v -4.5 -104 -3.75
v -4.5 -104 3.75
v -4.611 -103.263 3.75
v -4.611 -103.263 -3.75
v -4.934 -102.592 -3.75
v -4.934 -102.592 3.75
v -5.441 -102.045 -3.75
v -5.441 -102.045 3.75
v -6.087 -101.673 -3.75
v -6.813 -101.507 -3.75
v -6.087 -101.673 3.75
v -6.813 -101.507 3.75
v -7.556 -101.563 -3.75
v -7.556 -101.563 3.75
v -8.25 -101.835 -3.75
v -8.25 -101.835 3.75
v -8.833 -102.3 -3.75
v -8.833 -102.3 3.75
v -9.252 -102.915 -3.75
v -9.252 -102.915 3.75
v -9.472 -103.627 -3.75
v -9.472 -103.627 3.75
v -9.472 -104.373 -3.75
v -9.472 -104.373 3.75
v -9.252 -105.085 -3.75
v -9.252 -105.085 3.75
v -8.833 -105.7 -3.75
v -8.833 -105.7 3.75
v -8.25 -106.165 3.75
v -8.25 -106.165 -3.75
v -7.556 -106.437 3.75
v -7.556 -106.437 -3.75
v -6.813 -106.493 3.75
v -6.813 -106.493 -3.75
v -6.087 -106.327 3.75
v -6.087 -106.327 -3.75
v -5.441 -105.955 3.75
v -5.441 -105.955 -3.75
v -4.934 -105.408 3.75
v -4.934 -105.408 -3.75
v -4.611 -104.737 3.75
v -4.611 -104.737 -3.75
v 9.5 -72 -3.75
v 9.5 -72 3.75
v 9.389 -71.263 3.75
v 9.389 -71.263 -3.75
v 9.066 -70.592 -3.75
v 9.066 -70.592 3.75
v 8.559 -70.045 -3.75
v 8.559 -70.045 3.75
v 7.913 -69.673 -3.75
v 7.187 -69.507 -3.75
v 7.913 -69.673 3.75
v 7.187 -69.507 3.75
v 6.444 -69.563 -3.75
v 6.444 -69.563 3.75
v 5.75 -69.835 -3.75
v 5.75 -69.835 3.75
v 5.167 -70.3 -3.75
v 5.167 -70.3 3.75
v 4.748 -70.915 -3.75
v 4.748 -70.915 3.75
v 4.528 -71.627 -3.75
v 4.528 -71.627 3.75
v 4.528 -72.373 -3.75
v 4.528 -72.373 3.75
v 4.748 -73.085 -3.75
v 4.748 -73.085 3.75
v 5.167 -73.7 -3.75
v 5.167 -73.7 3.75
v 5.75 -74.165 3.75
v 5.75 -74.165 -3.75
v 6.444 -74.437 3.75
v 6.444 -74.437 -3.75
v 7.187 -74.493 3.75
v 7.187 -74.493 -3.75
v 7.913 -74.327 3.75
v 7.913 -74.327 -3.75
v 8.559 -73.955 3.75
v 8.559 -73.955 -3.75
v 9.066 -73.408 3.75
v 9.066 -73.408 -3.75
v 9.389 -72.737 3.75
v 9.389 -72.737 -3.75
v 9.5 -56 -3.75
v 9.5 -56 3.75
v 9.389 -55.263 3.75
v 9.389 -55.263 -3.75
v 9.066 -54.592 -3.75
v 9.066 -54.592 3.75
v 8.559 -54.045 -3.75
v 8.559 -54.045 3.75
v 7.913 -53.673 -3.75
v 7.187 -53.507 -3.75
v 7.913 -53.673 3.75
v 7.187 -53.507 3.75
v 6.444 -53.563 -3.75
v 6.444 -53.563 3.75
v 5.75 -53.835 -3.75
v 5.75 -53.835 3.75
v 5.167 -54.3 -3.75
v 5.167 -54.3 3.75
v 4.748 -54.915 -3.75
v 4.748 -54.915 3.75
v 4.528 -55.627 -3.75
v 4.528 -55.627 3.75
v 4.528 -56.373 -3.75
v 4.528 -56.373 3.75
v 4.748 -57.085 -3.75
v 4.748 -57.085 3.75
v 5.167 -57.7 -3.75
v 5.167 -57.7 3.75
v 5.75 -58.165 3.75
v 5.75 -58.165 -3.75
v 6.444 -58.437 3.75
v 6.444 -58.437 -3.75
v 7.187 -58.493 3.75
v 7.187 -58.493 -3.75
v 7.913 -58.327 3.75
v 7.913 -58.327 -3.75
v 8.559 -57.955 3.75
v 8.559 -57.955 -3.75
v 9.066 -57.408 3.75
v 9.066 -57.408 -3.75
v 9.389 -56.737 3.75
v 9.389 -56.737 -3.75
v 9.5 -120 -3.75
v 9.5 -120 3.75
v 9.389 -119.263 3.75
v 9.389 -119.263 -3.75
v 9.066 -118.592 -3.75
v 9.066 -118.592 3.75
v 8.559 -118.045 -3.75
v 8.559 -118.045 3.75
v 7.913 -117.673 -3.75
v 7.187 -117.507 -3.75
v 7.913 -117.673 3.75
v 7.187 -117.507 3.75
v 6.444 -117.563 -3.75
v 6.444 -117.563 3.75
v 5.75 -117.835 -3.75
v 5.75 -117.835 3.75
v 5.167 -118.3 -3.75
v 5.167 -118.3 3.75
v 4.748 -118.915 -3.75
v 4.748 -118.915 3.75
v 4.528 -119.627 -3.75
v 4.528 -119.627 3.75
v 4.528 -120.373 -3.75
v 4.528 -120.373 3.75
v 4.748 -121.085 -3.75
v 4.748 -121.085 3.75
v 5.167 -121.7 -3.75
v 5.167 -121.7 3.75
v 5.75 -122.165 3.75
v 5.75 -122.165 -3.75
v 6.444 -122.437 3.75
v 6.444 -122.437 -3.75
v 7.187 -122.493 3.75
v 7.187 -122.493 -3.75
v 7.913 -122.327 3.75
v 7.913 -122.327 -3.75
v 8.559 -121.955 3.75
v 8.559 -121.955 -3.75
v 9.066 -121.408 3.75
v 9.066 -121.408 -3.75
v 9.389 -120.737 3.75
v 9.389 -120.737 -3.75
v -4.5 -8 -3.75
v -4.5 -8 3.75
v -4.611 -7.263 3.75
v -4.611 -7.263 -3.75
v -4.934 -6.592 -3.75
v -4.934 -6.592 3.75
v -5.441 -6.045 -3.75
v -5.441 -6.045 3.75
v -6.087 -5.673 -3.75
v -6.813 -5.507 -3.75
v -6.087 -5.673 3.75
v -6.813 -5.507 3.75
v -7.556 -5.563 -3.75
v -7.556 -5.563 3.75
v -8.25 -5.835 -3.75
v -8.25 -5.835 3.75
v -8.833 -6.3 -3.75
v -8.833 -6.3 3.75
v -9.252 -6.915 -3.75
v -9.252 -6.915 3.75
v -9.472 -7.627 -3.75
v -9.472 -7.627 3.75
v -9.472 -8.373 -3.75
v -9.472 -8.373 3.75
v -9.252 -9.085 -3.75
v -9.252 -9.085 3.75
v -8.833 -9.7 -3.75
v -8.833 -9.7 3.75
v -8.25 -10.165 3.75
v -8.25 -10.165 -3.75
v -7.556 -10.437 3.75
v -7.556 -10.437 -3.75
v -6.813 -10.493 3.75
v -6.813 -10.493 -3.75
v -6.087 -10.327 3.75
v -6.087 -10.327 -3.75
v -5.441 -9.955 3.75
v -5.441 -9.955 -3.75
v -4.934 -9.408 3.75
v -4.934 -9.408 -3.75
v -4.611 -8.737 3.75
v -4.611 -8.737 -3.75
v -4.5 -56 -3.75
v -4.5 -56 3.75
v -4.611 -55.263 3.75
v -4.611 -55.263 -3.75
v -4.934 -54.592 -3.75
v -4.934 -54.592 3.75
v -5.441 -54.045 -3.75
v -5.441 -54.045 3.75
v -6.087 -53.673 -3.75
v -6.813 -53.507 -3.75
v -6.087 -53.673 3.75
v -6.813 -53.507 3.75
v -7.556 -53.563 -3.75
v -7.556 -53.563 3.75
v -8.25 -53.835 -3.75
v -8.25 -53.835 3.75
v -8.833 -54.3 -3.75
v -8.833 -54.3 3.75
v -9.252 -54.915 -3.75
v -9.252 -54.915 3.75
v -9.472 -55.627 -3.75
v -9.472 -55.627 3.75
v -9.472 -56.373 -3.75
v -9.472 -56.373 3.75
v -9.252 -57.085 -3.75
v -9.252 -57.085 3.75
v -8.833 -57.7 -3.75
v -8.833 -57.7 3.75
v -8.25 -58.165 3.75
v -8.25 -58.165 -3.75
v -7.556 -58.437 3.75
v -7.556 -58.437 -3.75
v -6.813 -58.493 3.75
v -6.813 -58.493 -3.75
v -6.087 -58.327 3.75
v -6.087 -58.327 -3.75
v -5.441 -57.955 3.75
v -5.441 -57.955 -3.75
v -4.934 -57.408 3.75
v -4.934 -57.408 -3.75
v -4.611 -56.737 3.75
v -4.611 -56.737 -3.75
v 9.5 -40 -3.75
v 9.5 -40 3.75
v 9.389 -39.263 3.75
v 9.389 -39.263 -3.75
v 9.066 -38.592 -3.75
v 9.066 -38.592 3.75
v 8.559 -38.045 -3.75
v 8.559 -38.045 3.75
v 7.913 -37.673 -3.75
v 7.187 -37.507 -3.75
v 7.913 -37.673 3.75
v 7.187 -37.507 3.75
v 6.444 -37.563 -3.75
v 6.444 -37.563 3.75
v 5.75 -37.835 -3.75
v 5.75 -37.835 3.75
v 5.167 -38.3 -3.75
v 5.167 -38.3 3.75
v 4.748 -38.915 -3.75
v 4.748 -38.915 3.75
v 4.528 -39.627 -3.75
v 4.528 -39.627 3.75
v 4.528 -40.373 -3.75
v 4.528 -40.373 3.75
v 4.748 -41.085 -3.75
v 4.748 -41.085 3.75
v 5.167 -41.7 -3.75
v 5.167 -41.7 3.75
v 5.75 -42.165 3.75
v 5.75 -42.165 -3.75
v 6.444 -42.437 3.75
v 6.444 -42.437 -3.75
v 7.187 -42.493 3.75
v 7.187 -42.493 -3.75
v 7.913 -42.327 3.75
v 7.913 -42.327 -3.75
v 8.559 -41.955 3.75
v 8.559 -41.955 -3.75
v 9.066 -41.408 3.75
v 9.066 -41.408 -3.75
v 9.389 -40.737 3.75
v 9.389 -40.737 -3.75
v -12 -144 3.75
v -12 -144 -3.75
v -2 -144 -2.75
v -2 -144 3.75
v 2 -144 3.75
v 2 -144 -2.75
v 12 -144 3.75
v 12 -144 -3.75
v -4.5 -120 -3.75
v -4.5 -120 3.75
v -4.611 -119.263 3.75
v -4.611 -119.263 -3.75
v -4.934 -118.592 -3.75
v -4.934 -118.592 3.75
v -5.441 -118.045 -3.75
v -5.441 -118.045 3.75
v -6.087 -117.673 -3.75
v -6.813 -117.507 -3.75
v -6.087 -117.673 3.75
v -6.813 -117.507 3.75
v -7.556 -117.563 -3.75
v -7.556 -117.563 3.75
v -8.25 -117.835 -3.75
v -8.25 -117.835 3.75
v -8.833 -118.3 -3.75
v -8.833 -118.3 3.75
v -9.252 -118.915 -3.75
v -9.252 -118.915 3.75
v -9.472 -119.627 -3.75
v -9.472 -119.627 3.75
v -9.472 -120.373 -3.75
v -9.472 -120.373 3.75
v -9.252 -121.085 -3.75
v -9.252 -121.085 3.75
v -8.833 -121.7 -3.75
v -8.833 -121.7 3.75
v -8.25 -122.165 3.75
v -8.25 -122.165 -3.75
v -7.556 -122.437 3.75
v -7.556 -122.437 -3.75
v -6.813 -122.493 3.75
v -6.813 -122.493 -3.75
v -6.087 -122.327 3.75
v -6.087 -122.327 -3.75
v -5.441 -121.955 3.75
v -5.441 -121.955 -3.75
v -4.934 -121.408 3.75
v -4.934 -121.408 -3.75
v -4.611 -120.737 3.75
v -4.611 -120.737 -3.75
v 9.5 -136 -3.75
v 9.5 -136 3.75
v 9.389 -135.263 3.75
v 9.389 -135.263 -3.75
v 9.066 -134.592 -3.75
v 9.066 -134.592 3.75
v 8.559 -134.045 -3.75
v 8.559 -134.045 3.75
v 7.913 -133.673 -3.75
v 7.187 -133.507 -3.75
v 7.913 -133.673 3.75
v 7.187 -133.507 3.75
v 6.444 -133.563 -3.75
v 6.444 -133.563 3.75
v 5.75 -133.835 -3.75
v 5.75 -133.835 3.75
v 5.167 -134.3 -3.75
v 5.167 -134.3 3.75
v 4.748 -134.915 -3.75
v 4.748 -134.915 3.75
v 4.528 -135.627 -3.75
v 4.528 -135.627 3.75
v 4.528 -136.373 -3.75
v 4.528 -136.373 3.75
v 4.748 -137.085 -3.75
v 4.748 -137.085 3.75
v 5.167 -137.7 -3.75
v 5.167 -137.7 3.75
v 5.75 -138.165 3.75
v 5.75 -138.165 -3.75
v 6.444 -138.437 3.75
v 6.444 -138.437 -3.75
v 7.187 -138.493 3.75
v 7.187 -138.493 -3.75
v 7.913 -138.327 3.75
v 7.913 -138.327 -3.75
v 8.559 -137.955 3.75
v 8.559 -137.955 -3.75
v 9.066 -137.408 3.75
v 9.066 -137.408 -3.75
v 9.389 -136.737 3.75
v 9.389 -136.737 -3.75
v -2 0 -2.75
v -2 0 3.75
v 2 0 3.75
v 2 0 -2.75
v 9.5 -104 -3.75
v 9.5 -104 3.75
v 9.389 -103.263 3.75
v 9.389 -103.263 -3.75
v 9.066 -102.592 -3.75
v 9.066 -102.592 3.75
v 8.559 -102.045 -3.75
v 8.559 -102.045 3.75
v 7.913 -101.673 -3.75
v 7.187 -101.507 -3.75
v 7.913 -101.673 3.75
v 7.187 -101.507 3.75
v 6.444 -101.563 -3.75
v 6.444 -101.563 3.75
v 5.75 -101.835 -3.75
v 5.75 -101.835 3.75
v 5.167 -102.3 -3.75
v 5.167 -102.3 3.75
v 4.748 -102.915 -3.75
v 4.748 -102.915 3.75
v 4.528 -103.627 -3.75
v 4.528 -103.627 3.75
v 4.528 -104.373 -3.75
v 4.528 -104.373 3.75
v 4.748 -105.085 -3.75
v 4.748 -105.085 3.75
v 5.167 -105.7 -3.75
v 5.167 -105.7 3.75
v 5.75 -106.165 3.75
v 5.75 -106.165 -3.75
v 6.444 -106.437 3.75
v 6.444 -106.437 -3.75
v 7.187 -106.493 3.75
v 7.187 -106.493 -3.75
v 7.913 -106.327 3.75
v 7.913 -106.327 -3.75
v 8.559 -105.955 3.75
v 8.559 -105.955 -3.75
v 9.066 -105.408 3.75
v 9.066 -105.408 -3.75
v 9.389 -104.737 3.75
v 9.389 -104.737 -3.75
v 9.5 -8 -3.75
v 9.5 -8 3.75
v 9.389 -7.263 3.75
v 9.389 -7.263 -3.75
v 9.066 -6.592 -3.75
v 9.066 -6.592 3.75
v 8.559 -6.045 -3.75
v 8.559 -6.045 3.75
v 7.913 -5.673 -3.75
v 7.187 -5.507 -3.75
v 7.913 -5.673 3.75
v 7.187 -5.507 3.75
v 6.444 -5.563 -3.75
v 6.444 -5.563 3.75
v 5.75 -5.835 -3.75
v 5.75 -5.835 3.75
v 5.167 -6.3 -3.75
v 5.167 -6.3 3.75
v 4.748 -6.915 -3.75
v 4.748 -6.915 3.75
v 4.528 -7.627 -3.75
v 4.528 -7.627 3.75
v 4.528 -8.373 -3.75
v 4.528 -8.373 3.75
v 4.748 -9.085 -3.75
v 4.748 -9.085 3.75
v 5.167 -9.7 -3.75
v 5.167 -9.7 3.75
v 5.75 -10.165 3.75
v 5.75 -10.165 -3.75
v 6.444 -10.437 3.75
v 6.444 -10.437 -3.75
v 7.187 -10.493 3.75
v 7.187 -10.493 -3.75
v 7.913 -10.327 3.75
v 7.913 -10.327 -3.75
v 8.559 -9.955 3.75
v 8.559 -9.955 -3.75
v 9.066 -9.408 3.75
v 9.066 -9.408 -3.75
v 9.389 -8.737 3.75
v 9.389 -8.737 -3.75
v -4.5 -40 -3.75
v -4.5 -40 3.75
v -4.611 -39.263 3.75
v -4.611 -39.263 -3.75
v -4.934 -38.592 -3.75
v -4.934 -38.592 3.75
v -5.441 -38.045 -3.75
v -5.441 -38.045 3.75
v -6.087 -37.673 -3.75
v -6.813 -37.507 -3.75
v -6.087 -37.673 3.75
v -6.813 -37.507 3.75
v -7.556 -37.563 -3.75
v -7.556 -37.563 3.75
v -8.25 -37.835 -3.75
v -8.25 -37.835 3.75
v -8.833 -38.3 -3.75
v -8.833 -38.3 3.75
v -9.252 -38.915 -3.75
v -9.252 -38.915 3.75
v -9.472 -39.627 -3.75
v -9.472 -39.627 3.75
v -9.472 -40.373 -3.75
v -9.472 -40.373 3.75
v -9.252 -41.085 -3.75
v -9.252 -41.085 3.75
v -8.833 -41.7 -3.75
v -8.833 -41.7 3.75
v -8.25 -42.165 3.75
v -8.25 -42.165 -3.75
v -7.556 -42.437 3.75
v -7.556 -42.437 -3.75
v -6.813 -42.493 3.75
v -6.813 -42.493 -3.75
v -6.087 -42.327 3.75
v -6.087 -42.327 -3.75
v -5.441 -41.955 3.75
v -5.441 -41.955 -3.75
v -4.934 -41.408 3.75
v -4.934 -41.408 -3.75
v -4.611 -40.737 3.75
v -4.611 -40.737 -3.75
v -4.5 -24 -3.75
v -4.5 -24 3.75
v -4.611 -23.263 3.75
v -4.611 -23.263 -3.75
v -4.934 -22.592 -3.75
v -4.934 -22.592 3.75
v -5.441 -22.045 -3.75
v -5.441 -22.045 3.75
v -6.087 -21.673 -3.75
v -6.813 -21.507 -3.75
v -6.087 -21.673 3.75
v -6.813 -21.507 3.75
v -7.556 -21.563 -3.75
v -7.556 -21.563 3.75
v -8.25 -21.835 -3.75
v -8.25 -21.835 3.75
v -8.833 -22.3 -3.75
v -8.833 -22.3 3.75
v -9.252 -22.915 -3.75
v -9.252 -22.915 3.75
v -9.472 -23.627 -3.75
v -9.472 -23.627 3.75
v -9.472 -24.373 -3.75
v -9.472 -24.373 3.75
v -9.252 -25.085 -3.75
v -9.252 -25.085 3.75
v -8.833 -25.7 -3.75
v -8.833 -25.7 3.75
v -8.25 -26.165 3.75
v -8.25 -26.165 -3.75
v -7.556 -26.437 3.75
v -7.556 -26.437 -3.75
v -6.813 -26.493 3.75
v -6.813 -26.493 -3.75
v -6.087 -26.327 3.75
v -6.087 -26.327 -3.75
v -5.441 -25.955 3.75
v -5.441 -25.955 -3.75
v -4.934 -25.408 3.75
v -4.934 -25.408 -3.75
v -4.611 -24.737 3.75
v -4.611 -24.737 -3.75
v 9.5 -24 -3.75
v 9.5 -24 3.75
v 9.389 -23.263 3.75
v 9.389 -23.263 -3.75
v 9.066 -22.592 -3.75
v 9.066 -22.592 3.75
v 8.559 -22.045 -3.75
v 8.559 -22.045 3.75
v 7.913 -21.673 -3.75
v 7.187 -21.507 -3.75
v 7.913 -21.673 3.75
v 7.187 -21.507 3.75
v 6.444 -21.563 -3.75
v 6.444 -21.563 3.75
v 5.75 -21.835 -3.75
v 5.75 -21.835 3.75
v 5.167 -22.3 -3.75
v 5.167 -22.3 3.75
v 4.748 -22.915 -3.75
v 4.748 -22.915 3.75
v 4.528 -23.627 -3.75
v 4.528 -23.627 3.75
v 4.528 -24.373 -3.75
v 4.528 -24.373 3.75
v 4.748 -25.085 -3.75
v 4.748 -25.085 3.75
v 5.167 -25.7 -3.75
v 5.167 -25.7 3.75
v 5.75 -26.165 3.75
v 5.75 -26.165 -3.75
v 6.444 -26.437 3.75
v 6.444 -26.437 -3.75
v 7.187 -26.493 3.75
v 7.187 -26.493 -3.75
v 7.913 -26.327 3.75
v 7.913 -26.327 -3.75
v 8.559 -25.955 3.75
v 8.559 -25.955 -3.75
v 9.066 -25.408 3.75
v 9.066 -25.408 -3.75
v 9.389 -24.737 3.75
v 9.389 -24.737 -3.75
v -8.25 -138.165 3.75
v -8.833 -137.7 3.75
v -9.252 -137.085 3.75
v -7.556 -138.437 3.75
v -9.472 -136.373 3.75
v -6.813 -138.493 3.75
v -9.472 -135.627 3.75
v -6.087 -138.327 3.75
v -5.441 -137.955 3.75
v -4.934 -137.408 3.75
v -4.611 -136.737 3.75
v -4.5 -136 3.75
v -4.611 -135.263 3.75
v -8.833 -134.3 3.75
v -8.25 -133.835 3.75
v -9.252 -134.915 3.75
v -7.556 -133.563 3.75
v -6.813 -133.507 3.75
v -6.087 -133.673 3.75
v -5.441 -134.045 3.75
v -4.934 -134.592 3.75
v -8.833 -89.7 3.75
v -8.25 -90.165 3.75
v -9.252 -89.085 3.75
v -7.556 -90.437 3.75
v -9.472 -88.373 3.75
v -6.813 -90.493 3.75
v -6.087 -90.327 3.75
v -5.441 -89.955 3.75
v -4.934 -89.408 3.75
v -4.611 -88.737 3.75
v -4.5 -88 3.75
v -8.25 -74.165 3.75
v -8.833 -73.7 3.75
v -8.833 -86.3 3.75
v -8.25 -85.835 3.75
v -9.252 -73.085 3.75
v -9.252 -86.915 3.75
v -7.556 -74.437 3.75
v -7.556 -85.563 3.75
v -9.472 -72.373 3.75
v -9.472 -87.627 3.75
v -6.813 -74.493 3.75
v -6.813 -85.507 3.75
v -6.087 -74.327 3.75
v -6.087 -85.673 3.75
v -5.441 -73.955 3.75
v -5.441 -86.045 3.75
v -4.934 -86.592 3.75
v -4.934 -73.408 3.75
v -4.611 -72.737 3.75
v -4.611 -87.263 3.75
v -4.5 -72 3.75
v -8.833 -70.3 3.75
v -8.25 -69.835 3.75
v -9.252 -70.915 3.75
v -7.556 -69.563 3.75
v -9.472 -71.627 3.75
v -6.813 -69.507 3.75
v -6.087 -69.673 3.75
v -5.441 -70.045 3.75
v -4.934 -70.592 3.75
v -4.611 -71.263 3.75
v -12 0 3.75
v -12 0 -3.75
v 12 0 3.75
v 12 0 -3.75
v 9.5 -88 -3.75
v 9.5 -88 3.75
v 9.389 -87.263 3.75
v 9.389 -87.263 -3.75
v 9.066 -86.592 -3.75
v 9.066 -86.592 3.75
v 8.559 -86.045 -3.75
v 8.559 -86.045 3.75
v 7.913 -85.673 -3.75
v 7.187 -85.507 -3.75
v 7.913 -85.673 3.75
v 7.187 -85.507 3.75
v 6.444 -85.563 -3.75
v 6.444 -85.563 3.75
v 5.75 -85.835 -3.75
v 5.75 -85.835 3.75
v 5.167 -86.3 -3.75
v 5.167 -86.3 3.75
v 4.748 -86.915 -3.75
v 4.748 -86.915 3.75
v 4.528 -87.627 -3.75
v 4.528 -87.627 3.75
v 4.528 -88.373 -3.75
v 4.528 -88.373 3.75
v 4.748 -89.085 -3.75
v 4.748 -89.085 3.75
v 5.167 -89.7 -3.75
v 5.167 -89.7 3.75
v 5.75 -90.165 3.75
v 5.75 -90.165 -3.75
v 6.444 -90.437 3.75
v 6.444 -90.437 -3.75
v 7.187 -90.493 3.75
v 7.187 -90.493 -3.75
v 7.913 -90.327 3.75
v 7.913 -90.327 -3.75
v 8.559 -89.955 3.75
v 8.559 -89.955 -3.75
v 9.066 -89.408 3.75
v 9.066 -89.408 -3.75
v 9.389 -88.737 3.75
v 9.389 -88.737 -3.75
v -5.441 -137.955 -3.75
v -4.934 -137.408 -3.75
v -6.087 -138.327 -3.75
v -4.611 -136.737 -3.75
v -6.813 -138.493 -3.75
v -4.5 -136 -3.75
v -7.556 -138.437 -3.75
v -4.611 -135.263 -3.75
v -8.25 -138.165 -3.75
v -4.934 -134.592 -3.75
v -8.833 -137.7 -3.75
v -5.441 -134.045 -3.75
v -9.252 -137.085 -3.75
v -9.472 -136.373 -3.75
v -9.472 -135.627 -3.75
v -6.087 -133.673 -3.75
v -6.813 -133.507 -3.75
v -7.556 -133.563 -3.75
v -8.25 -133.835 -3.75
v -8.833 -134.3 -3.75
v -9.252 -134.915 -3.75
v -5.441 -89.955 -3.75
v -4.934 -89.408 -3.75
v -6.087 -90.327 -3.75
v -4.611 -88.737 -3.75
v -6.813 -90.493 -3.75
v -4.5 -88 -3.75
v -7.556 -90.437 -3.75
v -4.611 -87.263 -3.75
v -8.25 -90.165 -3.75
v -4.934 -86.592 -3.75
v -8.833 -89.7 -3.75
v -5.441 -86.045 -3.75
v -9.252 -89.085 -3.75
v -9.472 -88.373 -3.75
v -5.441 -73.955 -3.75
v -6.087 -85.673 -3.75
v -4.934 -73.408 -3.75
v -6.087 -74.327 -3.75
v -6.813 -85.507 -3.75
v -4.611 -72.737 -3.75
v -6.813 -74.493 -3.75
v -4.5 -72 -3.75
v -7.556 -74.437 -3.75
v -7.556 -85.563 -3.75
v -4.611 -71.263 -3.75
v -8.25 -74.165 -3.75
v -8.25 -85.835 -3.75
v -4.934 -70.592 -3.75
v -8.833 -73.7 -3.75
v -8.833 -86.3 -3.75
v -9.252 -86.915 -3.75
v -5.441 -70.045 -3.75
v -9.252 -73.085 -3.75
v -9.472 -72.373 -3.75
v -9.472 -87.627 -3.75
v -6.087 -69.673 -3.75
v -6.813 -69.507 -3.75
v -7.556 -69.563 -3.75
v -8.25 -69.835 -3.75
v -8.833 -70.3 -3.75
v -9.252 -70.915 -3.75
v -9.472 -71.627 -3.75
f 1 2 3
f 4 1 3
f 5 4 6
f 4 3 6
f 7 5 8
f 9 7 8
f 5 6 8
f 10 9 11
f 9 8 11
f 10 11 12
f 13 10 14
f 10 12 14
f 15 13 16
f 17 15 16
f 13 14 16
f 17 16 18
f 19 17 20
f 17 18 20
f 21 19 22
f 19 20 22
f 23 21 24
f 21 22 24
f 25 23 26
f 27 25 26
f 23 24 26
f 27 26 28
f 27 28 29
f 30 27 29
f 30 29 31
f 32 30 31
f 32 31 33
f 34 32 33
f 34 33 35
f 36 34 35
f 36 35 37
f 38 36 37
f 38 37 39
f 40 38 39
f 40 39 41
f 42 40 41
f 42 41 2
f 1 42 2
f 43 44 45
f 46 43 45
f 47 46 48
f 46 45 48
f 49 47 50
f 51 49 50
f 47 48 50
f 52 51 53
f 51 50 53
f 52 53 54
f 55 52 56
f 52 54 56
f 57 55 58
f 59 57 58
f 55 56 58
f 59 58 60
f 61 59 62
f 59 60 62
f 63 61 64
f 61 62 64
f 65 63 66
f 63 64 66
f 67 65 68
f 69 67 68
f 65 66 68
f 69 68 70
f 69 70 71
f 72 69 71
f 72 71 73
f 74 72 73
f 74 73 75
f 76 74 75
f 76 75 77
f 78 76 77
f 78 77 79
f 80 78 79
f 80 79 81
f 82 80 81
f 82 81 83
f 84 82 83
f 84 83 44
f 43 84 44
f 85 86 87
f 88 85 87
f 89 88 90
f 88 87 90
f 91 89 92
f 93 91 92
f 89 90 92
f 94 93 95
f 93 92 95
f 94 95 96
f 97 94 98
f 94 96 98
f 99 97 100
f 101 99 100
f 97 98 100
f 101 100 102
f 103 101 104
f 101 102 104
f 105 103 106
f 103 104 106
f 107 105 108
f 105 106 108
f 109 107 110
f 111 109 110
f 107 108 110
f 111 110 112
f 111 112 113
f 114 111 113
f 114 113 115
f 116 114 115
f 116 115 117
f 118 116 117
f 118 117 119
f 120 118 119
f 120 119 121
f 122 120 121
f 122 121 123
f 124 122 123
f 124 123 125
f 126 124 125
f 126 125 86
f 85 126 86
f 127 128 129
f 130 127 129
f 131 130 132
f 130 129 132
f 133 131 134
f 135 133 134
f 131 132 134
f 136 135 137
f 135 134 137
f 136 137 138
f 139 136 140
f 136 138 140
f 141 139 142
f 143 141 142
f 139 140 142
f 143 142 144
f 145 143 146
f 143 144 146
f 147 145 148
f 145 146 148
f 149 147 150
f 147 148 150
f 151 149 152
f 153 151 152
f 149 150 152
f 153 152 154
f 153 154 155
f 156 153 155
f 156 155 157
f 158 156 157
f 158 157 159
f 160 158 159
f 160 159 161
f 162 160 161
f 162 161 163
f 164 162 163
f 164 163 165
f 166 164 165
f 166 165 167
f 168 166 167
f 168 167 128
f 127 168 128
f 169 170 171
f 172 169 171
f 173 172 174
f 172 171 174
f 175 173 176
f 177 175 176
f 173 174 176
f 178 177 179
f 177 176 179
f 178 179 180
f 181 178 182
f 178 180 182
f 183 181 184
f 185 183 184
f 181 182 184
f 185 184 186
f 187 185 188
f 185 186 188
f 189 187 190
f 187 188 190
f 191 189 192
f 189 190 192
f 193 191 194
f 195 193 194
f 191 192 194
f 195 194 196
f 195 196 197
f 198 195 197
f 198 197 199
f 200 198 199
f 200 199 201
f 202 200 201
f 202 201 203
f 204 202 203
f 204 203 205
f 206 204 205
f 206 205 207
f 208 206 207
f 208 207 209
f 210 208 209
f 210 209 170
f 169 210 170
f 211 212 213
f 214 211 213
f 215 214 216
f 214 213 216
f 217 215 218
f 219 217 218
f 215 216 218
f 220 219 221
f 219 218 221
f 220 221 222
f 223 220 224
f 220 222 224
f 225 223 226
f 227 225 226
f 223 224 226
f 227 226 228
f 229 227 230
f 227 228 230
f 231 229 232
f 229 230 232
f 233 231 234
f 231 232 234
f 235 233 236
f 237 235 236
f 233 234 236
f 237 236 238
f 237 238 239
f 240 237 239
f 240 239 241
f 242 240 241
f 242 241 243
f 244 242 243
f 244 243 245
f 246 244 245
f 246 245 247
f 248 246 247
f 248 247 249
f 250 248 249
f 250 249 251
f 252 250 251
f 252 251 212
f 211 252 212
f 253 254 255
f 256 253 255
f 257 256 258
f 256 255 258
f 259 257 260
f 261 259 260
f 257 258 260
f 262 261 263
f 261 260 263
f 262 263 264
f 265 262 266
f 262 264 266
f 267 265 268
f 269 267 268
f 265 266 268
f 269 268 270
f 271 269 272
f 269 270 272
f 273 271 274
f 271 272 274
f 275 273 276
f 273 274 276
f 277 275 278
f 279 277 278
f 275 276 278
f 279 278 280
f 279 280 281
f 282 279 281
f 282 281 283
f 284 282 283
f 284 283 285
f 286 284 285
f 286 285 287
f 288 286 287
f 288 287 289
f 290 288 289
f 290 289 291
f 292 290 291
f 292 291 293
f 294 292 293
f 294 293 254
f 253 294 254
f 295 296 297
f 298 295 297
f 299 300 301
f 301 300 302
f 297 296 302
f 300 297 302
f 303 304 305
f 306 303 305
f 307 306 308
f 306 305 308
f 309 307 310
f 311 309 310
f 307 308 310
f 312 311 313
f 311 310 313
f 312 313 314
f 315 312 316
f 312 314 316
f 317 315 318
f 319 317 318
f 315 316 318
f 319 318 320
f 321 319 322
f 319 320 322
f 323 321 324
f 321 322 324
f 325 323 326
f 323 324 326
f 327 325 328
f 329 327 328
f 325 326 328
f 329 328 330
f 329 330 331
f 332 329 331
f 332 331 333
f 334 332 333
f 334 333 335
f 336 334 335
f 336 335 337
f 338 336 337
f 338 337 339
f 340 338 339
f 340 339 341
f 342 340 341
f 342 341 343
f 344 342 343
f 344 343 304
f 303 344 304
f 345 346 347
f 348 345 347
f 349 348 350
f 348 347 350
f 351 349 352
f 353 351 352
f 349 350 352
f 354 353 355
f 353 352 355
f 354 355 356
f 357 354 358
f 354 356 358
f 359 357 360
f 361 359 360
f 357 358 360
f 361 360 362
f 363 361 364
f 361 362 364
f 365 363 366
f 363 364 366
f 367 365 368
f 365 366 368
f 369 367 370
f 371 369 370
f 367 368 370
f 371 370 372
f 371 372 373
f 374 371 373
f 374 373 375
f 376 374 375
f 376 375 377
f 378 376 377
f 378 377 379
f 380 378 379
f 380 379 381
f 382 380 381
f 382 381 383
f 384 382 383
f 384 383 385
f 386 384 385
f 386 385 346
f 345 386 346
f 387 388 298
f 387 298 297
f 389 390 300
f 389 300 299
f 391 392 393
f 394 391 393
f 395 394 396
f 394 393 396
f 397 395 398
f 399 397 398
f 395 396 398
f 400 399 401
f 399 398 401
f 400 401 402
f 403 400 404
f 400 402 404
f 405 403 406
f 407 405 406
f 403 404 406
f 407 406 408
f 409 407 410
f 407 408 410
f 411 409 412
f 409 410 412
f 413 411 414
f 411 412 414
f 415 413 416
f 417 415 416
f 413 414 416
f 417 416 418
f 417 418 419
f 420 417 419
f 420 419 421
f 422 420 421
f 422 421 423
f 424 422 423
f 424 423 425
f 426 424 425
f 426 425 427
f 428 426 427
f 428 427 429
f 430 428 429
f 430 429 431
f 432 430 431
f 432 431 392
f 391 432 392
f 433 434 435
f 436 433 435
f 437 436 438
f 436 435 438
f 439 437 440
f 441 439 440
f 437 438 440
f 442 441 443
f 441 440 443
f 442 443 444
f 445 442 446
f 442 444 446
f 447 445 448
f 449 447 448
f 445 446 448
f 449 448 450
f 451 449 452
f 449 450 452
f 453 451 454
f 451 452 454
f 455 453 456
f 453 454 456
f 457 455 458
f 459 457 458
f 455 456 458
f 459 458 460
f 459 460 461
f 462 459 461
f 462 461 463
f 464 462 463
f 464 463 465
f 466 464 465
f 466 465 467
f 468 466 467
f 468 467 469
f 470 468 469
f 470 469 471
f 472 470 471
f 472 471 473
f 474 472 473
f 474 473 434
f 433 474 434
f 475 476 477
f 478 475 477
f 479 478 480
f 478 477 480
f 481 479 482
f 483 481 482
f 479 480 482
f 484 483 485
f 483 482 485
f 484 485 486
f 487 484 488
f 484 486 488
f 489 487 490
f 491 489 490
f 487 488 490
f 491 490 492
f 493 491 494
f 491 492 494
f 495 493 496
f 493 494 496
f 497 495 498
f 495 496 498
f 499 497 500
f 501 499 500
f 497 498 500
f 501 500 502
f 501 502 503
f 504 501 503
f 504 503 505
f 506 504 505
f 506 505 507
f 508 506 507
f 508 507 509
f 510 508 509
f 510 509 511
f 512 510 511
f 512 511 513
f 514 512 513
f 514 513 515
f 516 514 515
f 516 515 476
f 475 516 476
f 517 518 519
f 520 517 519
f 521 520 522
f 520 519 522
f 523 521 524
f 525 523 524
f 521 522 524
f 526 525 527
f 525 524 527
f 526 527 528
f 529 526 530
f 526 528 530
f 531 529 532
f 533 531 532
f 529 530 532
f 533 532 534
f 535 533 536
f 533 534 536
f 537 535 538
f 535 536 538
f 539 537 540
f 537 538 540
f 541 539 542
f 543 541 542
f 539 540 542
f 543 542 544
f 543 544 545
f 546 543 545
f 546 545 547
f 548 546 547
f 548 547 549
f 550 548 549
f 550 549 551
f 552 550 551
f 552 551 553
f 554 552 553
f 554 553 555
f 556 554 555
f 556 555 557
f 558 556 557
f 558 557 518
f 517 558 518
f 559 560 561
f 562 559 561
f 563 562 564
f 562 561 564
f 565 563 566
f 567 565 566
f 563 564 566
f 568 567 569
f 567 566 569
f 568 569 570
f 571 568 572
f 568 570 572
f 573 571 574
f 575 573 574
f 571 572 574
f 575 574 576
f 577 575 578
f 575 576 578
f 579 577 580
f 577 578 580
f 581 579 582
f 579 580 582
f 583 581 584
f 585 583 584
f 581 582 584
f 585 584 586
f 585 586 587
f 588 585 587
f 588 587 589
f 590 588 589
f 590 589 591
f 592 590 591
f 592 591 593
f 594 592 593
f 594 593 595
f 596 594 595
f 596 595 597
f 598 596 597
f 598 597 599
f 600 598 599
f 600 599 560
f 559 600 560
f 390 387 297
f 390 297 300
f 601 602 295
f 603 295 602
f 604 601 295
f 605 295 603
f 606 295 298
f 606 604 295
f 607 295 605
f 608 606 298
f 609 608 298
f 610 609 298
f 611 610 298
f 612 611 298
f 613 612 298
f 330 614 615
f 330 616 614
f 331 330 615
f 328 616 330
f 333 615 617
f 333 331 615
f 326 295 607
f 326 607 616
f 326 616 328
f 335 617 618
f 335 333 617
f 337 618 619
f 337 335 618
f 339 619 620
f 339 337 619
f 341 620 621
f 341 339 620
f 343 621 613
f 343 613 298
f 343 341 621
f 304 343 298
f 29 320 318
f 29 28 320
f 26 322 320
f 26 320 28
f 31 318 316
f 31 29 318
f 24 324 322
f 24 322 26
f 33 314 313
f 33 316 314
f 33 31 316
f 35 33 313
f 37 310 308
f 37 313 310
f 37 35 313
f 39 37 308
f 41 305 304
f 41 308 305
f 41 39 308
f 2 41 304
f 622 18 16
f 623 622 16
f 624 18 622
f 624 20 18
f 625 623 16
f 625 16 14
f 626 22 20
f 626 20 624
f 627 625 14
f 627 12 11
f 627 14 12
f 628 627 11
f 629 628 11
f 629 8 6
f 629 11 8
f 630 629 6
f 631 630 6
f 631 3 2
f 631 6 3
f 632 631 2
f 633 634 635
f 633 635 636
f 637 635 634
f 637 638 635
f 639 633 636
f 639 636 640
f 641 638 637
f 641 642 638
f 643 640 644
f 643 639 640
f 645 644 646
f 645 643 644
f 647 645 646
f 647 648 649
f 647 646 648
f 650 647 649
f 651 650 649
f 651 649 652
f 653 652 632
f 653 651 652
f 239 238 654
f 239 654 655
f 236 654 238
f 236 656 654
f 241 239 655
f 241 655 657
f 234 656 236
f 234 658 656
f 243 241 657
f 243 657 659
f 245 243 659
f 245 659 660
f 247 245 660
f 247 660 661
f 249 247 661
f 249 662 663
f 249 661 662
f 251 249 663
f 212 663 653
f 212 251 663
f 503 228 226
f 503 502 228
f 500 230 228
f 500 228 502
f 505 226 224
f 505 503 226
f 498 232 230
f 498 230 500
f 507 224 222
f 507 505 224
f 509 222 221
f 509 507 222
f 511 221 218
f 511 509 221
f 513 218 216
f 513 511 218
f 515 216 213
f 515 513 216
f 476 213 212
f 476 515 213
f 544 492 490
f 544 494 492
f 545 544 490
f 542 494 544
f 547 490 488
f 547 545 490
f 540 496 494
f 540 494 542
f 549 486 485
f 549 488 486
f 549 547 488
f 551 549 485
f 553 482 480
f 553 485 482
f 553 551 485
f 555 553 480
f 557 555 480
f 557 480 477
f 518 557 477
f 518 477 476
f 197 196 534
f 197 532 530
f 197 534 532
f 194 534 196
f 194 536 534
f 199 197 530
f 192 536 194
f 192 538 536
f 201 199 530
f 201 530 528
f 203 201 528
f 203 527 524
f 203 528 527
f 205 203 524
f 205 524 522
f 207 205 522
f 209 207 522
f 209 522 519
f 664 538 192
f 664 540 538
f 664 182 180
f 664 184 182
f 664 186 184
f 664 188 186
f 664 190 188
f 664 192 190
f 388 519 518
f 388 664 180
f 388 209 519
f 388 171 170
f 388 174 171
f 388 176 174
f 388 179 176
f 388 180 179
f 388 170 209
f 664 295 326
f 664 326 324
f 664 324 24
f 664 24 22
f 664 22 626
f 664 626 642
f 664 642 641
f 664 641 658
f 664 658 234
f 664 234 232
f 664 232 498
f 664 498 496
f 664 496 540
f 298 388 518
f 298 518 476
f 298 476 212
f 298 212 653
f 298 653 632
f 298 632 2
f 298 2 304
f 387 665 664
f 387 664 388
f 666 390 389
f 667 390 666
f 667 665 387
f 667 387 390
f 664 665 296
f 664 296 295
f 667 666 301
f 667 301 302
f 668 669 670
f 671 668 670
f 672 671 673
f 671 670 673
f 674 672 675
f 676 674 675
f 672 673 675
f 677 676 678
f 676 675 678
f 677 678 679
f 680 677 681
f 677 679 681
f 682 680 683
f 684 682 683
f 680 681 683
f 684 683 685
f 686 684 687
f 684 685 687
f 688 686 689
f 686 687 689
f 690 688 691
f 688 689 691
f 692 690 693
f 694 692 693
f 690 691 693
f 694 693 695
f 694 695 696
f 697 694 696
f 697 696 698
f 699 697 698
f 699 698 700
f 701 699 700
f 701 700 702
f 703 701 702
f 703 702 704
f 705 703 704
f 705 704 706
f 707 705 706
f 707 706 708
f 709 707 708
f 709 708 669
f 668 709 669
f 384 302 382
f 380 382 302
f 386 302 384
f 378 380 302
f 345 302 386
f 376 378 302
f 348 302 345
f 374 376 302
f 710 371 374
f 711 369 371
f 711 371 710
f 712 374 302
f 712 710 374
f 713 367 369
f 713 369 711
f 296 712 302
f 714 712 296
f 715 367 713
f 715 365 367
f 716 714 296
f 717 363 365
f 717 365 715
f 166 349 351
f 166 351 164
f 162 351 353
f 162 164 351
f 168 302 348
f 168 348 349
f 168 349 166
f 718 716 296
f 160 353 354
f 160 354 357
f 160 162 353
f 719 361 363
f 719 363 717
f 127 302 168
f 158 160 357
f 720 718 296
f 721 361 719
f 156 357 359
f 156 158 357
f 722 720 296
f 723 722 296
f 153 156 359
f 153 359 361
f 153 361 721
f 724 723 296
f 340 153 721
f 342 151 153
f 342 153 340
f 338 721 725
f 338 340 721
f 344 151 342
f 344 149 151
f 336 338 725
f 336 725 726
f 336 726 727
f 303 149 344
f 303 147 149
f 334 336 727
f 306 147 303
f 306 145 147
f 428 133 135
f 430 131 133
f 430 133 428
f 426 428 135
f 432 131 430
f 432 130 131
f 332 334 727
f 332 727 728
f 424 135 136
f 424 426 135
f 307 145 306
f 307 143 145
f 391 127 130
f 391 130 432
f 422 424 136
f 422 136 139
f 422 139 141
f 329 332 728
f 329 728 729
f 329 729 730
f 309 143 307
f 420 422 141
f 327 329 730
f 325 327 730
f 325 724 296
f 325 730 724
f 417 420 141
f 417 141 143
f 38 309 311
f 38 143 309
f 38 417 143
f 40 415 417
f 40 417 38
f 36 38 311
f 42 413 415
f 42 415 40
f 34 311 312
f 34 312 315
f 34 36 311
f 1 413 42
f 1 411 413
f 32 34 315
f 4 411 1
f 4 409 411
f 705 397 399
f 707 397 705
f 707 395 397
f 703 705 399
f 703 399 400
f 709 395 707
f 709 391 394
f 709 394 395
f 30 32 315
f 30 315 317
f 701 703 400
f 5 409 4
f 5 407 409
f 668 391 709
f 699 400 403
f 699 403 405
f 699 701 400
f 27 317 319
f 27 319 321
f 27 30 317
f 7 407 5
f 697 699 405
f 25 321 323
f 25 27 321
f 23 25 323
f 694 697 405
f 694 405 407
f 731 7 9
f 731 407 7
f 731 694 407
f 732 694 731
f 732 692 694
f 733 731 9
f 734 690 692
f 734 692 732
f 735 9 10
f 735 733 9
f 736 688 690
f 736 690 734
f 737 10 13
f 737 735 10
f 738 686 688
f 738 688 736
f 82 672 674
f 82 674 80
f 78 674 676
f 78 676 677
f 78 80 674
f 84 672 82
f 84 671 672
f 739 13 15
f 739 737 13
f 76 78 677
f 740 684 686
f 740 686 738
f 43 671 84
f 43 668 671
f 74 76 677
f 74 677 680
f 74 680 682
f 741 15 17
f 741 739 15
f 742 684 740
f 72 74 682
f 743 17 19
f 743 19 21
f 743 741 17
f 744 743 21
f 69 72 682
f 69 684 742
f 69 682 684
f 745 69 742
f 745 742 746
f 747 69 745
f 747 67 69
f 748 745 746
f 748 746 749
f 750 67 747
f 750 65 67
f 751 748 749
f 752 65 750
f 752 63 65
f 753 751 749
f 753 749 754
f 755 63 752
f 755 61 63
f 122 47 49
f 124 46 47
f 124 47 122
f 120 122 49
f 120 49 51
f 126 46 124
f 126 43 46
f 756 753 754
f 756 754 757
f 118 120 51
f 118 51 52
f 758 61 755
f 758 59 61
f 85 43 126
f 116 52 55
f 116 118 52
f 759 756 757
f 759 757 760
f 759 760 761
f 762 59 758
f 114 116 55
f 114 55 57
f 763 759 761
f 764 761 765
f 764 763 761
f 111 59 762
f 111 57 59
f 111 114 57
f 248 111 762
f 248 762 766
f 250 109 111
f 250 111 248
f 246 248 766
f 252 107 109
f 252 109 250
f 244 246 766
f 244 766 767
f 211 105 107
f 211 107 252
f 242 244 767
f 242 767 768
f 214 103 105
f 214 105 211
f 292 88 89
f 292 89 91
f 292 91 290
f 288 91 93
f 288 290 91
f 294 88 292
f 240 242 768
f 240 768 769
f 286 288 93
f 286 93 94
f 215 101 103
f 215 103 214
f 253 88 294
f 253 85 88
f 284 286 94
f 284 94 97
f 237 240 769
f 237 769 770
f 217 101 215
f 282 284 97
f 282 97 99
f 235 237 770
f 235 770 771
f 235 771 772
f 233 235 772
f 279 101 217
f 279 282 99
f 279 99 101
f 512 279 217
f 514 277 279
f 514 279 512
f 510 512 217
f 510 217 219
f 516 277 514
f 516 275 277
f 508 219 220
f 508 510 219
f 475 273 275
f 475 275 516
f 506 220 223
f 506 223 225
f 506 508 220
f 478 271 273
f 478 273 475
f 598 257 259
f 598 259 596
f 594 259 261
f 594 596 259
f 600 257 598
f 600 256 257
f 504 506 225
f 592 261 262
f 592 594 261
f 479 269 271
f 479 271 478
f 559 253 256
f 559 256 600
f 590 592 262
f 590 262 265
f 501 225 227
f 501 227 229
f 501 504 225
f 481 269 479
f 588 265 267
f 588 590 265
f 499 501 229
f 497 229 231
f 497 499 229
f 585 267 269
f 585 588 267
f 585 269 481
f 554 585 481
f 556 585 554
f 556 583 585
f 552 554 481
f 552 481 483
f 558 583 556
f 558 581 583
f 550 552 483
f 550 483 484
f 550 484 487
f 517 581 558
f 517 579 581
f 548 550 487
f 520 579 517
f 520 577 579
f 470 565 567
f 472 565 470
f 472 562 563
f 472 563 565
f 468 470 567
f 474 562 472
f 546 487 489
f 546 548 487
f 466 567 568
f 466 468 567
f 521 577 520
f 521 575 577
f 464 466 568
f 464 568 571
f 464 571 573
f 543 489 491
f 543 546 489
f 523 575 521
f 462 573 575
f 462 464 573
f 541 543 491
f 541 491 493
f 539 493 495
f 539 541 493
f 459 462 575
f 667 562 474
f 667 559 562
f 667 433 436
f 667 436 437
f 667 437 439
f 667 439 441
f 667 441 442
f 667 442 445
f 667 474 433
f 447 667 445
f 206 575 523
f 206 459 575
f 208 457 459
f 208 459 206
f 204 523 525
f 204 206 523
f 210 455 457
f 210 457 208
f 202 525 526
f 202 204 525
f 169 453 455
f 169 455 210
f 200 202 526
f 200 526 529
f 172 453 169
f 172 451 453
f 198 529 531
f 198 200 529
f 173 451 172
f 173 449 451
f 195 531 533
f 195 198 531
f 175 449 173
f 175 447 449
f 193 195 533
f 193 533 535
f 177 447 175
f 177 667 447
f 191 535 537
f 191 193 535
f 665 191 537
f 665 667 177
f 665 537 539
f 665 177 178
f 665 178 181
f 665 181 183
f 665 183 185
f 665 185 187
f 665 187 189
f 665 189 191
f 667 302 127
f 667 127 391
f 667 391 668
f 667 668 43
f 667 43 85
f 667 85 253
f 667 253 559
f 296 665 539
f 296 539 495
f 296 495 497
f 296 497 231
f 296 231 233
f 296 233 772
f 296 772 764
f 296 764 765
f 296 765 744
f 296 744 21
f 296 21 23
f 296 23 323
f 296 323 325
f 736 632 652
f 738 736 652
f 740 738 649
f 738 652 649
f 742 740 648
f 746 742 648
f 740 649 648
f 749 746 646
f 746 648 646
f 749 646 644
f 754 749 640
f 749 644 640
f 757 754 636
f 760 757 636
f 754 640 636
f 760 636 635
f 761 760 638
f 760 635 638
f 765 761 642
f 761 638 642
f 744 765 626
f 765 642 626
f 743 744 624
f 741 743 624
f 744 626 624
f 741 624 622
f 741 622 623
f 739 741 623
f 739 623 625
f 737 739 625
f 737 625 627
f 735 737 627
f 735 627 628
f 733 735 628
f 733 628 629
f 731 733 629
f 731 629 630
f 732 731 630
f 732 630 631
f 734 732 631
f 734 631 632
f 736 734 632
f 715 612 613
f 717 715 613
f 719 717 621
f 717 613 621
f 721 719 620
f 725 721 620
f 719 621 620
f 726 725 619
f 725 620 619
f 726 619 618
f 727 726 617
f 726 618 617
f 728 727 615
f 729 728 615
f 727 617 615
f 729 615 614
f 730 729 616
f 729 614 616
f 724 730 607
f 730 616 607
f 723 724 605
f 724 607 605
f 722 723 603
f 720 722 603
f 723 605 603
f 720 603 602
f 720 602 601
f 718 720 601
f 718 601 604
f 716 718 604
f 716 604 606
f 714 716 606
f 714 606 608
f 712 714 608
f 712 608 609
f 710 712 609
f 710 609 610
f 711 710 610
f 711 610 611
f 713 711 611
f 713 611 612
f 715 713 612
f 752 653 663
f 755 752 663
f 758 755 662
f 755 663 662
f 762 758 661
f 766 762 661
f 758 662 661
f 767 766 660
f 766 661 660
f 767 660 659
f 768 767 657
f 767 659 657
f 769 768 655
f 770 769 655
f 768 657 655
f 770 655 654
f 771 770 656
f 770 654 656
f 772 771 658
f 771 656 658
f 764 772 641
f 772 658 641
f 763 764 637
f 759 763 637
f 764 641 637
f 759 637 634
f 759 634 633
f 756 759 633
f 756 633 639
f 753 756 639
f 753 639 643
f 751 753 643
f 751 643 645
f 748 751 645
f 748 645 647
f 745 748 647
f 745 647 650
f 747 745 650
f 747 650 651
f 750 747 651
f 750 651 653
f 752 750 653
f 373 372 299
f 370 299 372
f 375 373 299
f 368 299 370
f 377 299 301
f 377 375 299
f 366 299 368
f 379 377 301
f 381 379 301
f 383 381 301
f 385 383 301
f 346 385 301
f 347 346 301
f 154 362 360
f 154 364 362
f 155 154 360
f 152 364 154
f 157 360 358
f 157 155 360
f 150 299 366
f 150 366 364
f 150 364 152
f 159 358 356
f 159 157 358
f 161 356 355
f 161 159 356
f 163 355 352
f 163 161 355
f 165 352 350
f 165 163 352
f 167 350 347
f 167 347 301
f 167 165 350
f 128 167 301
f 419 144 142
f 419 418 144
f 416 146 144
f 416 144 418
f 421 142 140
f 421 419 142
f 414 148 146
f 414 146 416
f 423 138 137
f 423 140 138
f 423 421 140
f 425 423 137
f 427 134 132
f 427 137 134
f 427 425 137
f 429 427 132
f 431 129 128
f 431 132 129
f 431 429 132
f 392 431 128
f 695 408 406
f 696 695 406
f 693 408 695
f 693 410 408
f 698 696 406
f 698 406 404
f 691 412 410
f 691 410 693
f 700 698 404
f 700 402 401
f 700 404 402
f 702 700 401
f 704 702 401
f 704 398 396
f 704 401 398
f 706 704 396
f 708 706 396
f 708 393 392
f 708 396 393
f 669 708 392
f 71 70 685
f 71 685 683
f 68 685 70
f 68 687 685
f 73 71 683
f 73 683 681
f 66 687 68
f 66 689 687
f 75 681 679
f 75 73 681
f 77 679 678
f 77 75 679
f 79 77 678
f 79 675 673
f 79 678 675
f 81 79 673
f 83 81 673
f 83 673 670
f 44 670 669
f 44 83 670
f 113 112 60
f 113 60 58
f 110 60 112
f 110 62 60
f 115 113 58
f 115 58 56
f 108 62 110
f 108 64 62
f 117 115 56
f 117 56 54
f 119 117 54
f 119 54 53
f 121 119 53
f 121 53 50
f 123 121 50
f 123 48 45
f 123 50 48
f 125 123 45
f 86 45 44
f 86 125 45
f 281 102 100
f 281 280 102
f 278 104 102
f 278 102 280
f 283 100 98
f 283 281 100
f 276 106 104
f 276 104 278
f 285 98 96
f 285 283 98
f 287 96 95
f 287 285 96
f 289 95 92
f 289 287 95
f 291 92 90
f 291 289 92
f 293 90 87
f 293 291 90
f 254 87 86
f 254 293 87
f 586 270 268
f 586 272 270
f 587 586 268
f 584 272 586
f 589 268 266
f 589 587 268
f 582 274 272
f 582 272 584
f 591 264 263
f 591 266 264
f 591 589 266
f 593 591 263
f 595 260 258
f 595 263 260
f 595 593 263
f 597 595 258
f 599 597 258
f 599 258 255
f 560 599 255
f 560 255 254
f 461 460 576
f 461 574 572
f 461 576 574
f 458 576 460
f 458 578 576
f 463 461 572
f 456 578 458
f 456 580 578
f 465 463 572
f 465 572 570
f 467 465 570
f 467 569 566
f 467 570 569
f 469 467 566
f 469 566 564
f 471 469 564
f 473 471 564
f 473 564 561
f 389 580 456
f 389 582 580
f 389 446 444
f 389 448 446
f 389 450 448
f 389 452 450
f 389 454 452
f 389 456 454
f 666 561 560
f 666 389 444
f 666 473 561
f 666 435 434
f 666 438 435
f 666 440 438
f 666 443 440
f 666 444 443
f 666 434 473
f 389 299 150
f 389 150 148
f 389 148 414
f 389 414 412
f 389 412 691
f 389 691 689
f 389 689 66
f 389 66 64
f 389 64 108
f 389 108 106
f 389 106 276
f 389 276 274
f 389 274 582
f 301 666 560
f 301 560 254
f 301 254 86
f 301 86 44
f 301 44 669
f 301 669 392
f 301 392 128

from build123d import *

# Parameters (mm, degrees)
BASE_DEPTH  = 144
ESQUISSE2_R = 2.5
TROU_DEPTH  = 145.693641878


with BuildPart() as part:
    # Esquisse1 → BASE (new body)
    with BuildSketch(Plane(origin=(0, 0, 0), x_dir=(1, 0, 0), z_dir=(0, 1, 0))):
        Polygon((-2, -3.75), (-2, 2.75), (2, 2.75), (2, -3.75), (12, -3.75), (12, 3.75), (-12, 3.75), (-12, -3.75), align=None)
    extrude(amount=-BASE_DEPTH)

    # Esquisse2 → TROU (cut, through all)
    with BuildSketch(Plane.XY.offset(3.75)):
        with Locations((-7, -8)):
            Circle(ESQUISSE2_R)
        with Locations((7, -8)):
            Circle(ESQUISSE2_R)
        with Locations((7, -24)):
            Circle(ESQUISSE2_R)
        with Locations((7, -40)):
            Circle(ESQUISSE2_R)
        with Locations((7, -56)):
            Circle(ESQUISSE2_R)
        with Locations((7, -72)):
            Circle(ESQUISSE2_R)
        with Locations((7, -88)):
            Circle(ESQUISSE2_R)
        with Locations((7, -104)):
            Circle(ESQUISSE2_R)
        with Locations((7, -120)):
            Circle(ESQUISSE2_R)
        with Locations((7, -136)):
            Circle(ESQUISSE2_R)
        with Locations((-7, -24)):
            Circle(ESQUISSE2_R)
        with Locations((-7, -40)):
            Circle(ESQUISSE2_R)
        with Locations((-7, -56)):
            Circle(ESQUISSE2_R)
        with Locations((-7, -72)):
            Circle(ESQUISSE2_R)
        with Locations((-7, -88)):
            Circle(ESQUISSE2_R)
        with Locations((-7, -104)):
            Circle(ESQUISSE2_R)
        with Locations((-7, -120)):
            Circle(ESQUISSE2_R)
        with Locations((-7, -136)):
            Circle(ESQUISSE2_R)
    extrude(amount=-TROU_DEPTH, mode=Mode.SUBTRACT)


solid = part.part
